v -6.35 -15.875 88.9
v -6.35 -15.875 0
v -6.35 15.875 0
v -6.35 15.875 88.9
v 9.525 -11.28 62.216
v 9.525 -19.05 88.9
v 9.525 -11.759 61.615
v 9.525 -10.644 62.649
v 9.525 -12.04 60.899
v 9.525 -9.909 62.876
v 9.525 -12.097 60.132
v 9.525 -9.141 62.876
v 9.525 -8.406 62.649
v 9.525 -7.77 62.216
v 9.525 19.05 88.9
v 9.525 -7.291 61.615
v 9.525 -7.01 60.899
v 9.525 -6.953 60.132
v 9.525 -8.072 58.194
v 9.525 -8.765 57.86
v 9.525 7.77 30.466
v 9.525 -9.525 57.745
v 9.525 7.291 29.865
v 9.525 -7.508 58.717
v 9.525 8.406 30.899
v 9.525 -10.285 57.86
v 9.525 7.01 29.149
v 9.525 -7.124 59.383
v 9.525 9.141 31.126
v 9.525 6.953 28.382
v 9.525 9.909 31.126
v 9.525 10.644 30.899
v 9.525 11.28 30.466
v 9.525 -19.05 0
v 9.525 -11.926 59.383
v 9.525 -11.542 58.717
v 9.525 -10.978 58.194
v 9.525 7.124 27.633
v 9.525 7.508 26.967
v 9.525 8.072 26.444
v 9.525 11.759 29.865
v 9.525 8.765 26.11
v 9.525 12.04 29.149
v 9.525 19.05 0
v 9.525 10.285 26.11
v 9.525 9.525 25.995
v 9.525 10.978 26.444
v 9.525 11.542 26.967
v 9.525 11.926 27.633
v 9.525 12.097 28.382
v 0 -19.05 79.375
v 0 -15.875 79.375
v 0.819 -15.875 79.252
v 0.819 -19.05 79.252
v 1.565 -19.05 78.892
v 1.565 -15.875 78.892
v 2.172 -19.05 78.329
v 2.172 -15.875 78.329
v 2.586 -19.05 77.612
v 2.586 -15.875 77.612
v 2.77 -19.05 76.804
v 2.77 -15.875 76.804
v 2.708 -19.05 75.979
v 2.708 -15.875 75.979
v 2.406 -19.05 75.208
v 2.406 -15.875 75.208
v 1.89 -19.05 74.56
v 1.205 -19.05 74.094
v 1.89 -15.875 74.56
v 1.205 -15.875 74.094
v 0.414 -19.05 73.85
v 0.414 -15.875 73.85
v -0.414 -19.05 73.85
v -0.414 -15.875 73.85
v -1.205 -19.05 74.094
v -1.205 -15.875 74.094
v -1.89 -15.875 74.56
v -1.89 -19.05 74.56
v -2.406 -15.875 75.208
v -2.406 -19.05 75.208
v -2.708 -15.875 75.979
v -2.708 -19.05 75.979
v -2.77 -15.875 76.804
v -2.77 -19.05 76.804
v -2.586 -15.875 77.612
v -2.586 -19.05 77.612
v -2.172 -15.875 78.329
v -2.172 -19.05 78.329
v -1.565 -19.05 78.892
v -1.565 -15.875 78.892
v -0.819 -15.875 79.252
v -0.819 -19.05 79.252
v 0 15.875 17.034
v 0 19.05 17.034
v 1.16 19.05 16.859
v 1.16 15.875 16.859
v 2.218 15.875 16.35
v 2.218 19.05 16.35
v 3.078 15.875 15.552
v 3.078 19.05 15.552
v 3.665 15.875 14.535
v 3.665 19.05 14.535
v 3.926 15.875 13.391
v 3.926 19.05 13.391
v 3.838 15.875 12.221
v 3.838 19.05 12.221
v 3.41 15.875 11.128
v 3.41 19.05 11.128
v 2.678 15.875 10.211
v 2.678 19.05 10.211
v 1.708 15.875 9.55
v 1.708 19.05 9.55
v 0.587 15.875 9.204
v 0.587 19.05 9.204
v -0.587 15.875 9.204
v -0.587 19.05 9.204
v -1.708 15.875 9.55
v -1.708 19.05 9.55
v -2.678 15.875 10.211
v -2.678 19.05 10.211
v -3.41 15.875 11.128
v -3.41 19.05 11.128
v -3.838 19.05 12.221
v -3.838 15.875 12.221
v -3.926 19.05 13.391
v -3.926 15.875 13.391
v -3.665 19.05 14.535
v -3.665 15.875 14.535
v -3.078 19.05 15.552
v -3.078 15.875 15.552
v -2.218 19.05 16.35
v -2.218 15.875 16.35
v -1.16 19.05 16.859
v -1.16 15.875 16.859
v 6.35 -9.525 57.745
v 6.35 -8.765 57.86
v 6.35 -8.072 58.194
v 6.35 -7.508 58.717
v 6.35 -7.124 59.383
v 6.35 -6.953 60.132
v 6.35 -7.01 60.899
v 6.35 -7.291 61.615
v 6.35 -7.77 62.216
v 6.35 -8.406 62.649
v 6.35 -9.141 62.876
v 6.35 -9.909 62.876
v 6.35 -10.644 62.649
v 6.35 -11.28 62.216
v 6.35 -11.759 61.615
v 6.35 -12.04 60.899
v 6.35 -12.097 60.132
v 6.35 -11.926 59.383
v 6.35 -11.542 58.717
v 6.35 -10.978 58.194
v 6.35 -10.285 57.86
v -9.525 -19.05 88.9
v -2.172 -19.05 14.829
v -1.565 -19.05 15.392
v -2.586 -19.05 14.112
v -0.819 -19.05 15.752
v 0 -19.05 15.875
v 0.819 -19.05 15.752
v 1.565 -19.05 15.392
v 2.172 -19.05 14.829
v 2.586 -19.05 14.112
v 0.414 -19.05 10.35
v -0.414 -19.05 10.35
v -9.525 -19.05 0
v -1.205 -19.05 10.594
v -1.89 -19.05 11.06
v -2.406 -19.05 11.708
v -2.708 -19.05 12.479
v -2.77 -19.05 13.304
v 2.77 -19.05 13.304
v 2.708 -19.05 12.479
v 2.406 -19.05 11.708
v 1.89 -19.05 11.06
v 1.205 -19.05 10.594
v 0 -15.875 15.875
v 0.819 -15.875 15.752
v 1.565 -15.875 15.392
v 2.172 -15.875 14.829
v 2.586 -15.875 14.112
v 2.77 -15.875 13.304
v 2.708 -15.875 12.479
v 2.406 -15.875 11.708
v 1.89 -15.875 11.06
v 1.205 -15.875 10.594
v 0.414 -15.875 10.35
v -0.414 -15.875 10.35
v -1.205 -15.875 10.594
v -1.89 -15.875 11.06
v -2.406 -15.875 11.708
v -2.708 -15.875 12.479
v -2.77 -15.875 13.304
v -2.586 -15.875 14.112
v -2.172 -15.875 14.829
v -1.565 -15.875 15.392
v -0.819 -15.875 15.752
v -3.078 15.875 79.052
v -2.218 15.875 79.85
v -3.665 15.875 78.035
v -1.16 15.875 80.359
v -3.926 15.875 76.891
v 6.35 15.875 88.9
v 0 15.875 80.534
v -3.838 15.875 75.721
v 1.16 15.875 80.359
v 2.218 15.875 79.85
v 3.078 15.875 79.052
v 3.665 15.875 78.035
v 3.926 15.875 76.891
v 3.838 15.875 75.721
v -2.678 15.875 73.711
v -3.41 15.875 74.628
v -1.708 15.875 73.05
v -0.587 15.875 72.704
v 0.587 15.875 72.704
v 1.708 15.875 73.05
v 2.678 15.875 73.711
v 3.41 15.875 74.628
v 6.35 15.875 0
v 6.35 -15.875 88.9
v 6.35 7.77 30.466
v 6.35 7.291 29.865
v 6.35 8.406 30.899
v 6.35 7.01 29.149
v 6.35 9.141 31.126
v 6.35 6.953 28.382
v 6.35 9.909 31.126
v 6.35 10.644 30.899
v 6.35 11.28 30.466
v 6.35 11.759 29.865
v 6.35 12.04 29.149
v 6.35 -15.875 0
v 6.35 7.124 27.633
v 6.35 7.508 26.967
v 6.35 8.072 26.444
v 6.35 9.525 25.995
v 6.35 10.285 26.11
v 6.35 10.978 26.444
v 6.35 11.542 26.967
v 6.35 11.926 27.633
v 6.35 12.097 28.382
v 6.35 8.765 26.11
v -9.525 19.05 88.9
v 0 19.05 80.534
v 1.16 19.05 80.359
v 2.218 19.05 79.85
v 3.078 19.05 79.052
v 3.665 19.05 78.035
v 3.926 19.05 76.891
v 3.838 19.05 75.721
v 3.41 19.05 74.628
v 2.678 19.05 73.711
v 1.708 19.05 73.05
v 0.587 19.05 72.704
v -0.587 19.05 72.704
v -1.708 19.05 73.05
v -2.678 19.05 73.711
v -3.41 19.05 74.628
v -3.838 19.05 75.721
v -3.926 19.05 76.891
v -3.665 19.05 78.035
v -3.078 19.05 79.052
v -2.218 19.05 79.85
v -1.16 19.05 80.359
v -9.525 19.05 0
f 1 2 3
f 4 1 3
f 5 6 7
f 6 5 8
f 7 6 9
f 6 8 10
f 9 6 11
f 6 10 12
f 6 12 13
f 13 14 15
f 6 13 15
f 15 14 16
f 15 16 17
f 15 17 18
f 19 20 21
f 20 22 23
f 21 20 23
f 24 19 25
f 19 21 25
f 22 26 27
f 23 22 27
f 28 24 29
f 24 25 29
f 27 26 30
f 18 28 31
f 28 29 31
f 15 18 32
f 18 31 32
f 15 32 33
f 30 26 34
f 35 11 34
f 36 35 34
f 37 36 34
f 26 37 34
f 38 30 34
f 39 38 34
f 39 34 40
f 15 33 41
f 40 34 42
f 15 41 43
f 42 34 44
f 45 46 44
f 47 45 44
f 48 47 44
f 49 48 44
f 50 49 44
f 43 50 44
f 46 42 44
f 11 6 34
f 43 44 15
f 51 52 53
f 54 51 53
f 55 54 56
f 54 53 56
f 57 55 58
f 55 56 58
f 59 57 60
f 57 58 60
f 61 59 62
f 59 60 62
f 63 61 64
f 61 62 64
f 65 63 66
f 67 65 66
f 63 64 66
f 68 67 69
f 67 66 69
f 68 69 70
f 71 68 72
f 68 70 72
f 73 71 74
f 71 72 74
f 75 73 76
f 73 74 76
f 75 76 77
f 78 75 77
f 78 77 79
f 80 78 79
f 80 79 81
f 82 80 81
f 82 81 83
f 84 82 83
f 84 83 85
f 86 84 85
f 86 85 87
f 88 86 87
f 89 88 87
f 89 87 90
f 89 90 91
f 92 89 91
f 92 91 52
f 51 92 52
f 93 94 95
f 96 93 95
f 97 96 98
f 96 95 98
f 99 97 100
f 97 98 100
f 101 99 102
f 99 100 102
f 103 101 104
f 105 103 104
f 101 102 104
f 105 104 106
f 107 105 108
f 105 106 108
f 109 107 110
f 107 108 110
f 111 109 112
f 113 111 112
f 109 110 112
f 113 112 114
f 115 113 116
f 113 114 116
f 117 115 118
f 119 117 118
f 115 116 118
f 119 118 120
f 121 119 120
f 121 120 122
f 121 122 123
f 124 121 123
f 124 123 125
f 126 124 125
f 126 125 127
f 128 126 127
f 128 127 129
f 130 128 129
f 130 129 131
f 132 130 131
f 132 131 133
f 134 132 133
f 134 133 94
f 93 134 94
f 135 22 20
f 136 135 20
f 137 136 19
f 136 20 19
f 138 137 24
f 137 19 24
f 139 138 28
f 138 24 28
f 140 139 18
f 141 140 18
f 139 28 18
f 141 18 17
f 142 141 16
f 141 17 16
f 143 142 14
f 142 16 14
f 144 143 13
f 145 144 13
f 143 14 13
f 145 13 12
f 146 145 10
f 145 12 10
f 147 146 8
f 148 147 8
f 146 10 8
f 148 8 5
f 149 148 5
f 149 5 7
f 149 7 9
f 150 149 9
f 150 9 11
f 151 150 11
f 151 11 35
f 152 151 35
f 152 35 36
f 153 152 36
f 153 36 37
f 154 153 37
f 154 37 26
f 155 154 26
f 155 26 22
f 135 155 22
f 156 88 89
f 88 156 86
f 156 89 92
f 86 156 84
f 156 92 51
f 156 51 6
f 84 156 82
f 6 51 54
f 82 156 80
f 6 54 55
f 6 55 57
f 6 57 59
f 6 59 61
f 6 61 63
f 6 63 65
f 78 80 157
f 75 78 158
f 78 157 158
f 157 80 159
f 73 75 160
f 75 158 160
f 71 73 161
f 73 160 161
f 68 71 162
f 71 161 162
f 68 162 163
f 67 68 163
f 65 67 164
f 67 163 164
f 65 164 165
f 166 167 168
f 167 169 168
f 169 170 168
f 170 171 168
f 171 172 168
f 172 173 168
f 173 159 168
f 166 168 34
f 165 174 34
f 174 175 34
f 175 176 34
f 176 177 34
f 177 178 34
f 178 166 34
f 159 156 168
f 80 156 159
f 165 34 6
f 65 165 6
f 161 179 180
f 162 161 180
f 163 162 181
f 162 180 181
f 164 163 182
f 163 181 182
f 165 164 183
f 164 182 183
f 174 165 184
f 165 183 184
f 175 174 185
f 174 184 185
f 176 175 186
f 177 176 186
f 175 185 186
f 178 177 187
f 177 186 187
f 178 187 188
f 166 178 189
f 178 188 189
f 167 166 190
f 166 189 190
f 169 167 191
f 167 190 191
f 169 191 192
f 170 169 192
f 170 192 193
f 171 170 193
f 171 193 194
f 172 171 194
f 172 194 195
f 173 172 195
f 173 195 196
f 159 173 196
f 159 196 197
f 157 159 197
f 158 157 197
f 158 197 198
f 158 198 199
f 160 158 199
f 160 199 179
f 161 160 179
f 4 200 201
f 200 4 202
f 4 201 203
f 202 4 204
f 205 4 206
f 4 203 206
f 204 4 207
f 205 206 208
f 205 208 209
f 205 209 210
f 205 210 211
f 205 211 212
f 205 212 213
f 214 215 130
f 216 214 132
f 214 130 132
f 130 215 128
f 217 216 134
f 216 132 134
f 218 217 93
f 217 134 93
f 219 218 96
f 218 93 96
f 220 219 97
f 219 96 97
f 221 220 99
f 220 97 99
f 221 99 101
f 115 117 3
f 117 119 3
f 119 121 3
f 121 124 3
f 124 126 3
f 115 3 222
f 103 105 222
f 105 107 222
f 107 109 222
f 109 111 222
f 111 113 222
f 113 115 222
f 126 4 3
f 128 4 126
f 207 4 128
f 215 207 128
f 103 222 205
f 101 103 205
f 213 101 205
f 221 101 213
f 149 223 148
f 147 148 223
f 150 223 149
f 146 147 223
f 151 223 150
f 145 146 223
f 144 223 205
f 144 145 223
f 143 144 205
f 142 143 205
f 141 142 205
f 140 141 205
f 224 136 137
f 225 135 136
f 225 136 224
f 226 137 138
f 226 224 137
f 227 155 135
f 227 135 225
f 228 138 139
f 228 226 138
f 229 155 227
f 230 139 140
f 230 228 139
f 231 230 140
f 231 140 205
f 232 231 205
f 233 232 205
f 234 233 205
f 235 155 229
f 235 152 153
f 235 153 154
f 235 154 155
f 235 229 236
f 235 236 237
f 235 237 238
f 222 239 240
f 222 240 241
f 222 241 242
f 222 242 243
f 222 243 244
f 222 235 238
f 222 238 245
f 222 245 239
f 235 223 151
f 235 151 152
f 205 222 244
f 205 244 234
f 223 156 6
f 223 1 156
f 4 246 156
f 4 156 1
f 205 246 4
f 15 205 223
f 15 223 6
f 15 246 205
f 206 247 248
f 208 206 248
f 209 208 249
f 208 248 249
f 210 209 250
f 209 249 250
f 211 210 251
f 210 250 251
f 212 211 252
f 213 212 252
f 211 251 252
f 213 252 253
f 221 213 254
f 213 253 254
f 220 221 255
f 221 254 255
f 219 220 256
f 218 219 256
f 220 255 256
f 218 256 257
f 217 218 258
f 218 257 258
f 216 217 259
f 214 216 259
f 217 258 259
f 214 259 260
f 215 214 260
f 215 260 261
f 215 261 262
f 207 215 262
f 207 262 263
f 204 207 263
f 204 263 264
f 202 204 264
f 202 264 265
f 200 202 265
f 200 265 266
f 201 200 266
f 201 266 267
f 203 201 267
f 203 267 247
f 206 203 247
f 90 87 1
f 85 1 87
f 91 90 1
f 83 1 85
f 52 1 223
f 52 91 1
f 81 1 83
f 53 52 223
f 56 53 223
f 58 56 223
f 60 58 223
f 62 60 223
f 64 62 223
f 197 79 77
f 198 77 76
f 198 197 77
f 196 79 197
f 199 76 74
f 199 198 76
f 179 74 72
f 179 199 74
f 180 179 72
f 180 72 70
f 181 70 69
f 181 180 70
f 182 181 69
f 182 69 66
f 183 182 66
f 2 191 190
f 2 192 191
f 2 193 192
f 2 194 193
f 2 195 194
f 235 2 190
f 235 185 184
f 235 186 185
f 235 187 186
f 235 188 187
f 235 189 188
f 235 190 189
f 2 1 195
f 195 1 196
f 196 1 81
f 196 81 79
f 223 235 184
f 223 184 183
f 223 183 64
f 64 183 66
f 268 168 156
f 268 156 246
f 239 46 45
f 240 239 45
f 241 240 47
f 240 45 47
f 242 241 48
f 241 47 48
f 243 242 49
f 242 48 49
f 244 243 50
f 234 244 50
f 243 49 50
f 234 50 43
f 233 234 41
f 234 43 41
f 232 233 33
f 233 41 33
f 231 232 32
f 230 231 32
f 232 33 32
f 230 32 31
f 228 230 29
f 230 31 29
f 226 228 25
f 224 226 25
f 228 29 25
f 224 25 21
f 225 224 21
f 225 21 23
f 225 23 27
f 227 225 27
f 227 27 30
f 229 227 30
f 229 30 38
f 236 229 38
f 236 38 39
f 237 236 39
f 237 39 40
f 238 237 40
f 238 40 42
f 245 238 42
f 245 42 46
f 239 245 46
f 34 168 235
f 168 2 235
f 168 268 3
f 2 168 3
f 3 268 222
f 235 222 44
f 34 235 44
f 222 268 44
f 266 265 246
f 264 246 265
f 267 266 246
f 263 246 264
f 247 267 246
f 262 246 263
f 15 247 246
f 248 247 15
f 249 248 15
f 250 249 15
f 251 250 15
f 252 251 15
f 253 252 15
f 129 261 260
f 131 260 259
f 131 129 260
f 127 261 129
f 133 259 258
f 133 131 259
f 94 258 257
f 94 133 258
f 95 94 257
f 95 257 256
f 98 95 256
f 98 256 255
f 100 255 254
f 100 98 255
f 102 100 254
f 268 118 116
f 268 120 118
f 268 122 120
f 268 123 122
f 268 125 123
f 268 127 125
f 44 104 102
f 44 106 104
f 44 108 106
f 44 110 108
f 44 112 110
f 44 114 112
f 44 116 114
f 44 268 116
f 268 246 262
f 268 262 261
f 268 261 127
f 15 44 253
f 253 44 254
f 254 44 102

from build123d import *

# Parameters (mm, degrees)
SKETCH1_W           = 19.05
SKETCH1_H           = 38.1
SKETCH1_W_2         = 12.7
SKETCH1_H_2         = 31.75
BOSS_EXTRUDE1_DEPTH = 88.9
SKETCH2_R           = 2.778125
CUT_EXTRUDE1_DEPTH  = 98.188196943
CUT_EXTRUDE2_REACH  = 99.188
SKETCH3_R           = 3.937
CUT_EXTRUDE3_REACH  = 94.892
SKETCH4_R           = 2.5796875


with BuildPart() as part:
    # Sketch1 → Boss-Extrude1 (new body)
    with BuildSketch(Plane.XY):
        Rectangle(SKETCH1_W, SKETCH1_H)
        Rectangle(SKETCH1_W_2, SKETCH1_H_2, mode=Mode.SUBTRACT)
    extrude(amount=BOSS_EXTRUDE1_DEPTH)

    # Sketch2 → Cut-Extrude1 (cut, through all)
    with BuildSketch(Plane(origin=(0, 19.05, 0), x_dir=(1, 0, 0), z_dir=(0, 1, 0))):
        with Locations(Location((0, -76.596875, 0), (0, 0, 270))):
            Circle(SKETCH2_R)
        with Locations(Location((0, -13.096875, 0), (0, 0, 270))):
            Circle(SKETCH2_R)
    extrude(amount=-CUT_EXTRUDE1_DEPTH, mode=Mode.SUBTRACT)

    # Sketch3 → Cut-Extrude2 (cut, up to next)
    with BuildSketch(Plane(origin=(0, 19.05, 0), x_dir=(1, 0, 0), z_dir=(0, 1, 0)), mode=Mode.PRIVATE) as cut_extrude2_sk1:
        with Locations(Location((0, -76.596875, 0), (0, 0, 270))):
            Circle(SKETCH3_R)
    cut_extrude2_tool1 = extrude(cut_extrude2_sk1.sketch, amount=-CUT_EXTRUDE2_REACH, mode=Mode.PRIVATE) & part.part
    # Sketch3 → Cut-Extrude2 (cut, up to next)
    with BuildSketch(Plane(origin=(0, 19.05, 0), x_dir=(1, 0, 0), z_dir=(0, 1, 0)), mode=Mode.PRIVATE) as cut_extrude2_sk2:
        with Locations(Location((0, -13.096875, 0), (0, 0, 270))):
            Circle(SKETCH3_R)
    cut_extrude2_tool2 = extrude(cut_extrude2_sk2.sketch, amount=-CUT_EXTRUDE2_REACH, mode=Mode.PRIVATE) & part.part
    add(cut_extrude2_tool1.solids().sort_by_distance((0, 19.05, 76.596875))[0], mode=Mode.SUBTRACT)
    add(cut_extrude2_tool2.solids().sort_by_distance((0, 19.05, 13.096875))[0], mode=Mode.SUBTRACT)

    # Sketch4 → Cut-Extrude3 (cut, up to next)
    with BuildSketch(Plane(origin=(9.525, 0, 0), x_dir=(0, 0, -1), z_dir=(1, 0, 0)), mode=Mode.PRIVATE) as cut_extrude3_sk1:
        with Locations((-60.325, -9.525)):
            Circle(SKETCH4_R)
    cut_extrude3_tool1 = extrude(cut_extrude3_sk1.sketch, amount=-CUT_EXTRUDE3_REACH, mode=Mode.PRIVATE) & part.part
    # Sketch4 → Cut-Extrude3 (cut, up to next)
    with BuildSketch(Plane(origin=(9.525, 0, 0), x_dir=(0, 0, -1), z_dir=(1, 0, 0)), mode=Mode.PRIVATE) as cut_extrude3_sk2:
        with Locations((-28.575, 9.525)):
            Circle(SKETCH4_R)
    cut_extrude3_tool2 = extrude(cut_extrude3_sk2.sketch, amount=-CUT_EXTRUDE3_REACH, mode=Mode.PRIVATE) & part.part
    add(cut_extrude3_tool1.solids().sort_by_distance((9.525, -9.525, 60.325))[0], mode=Mode.SUBTRACT)
    add(cut_extrude3_tool2.solids().sort_by_distance((9.525, 9.525, 28.575))[0], mode=Mode.SUBTRACT)


solid = part.part
